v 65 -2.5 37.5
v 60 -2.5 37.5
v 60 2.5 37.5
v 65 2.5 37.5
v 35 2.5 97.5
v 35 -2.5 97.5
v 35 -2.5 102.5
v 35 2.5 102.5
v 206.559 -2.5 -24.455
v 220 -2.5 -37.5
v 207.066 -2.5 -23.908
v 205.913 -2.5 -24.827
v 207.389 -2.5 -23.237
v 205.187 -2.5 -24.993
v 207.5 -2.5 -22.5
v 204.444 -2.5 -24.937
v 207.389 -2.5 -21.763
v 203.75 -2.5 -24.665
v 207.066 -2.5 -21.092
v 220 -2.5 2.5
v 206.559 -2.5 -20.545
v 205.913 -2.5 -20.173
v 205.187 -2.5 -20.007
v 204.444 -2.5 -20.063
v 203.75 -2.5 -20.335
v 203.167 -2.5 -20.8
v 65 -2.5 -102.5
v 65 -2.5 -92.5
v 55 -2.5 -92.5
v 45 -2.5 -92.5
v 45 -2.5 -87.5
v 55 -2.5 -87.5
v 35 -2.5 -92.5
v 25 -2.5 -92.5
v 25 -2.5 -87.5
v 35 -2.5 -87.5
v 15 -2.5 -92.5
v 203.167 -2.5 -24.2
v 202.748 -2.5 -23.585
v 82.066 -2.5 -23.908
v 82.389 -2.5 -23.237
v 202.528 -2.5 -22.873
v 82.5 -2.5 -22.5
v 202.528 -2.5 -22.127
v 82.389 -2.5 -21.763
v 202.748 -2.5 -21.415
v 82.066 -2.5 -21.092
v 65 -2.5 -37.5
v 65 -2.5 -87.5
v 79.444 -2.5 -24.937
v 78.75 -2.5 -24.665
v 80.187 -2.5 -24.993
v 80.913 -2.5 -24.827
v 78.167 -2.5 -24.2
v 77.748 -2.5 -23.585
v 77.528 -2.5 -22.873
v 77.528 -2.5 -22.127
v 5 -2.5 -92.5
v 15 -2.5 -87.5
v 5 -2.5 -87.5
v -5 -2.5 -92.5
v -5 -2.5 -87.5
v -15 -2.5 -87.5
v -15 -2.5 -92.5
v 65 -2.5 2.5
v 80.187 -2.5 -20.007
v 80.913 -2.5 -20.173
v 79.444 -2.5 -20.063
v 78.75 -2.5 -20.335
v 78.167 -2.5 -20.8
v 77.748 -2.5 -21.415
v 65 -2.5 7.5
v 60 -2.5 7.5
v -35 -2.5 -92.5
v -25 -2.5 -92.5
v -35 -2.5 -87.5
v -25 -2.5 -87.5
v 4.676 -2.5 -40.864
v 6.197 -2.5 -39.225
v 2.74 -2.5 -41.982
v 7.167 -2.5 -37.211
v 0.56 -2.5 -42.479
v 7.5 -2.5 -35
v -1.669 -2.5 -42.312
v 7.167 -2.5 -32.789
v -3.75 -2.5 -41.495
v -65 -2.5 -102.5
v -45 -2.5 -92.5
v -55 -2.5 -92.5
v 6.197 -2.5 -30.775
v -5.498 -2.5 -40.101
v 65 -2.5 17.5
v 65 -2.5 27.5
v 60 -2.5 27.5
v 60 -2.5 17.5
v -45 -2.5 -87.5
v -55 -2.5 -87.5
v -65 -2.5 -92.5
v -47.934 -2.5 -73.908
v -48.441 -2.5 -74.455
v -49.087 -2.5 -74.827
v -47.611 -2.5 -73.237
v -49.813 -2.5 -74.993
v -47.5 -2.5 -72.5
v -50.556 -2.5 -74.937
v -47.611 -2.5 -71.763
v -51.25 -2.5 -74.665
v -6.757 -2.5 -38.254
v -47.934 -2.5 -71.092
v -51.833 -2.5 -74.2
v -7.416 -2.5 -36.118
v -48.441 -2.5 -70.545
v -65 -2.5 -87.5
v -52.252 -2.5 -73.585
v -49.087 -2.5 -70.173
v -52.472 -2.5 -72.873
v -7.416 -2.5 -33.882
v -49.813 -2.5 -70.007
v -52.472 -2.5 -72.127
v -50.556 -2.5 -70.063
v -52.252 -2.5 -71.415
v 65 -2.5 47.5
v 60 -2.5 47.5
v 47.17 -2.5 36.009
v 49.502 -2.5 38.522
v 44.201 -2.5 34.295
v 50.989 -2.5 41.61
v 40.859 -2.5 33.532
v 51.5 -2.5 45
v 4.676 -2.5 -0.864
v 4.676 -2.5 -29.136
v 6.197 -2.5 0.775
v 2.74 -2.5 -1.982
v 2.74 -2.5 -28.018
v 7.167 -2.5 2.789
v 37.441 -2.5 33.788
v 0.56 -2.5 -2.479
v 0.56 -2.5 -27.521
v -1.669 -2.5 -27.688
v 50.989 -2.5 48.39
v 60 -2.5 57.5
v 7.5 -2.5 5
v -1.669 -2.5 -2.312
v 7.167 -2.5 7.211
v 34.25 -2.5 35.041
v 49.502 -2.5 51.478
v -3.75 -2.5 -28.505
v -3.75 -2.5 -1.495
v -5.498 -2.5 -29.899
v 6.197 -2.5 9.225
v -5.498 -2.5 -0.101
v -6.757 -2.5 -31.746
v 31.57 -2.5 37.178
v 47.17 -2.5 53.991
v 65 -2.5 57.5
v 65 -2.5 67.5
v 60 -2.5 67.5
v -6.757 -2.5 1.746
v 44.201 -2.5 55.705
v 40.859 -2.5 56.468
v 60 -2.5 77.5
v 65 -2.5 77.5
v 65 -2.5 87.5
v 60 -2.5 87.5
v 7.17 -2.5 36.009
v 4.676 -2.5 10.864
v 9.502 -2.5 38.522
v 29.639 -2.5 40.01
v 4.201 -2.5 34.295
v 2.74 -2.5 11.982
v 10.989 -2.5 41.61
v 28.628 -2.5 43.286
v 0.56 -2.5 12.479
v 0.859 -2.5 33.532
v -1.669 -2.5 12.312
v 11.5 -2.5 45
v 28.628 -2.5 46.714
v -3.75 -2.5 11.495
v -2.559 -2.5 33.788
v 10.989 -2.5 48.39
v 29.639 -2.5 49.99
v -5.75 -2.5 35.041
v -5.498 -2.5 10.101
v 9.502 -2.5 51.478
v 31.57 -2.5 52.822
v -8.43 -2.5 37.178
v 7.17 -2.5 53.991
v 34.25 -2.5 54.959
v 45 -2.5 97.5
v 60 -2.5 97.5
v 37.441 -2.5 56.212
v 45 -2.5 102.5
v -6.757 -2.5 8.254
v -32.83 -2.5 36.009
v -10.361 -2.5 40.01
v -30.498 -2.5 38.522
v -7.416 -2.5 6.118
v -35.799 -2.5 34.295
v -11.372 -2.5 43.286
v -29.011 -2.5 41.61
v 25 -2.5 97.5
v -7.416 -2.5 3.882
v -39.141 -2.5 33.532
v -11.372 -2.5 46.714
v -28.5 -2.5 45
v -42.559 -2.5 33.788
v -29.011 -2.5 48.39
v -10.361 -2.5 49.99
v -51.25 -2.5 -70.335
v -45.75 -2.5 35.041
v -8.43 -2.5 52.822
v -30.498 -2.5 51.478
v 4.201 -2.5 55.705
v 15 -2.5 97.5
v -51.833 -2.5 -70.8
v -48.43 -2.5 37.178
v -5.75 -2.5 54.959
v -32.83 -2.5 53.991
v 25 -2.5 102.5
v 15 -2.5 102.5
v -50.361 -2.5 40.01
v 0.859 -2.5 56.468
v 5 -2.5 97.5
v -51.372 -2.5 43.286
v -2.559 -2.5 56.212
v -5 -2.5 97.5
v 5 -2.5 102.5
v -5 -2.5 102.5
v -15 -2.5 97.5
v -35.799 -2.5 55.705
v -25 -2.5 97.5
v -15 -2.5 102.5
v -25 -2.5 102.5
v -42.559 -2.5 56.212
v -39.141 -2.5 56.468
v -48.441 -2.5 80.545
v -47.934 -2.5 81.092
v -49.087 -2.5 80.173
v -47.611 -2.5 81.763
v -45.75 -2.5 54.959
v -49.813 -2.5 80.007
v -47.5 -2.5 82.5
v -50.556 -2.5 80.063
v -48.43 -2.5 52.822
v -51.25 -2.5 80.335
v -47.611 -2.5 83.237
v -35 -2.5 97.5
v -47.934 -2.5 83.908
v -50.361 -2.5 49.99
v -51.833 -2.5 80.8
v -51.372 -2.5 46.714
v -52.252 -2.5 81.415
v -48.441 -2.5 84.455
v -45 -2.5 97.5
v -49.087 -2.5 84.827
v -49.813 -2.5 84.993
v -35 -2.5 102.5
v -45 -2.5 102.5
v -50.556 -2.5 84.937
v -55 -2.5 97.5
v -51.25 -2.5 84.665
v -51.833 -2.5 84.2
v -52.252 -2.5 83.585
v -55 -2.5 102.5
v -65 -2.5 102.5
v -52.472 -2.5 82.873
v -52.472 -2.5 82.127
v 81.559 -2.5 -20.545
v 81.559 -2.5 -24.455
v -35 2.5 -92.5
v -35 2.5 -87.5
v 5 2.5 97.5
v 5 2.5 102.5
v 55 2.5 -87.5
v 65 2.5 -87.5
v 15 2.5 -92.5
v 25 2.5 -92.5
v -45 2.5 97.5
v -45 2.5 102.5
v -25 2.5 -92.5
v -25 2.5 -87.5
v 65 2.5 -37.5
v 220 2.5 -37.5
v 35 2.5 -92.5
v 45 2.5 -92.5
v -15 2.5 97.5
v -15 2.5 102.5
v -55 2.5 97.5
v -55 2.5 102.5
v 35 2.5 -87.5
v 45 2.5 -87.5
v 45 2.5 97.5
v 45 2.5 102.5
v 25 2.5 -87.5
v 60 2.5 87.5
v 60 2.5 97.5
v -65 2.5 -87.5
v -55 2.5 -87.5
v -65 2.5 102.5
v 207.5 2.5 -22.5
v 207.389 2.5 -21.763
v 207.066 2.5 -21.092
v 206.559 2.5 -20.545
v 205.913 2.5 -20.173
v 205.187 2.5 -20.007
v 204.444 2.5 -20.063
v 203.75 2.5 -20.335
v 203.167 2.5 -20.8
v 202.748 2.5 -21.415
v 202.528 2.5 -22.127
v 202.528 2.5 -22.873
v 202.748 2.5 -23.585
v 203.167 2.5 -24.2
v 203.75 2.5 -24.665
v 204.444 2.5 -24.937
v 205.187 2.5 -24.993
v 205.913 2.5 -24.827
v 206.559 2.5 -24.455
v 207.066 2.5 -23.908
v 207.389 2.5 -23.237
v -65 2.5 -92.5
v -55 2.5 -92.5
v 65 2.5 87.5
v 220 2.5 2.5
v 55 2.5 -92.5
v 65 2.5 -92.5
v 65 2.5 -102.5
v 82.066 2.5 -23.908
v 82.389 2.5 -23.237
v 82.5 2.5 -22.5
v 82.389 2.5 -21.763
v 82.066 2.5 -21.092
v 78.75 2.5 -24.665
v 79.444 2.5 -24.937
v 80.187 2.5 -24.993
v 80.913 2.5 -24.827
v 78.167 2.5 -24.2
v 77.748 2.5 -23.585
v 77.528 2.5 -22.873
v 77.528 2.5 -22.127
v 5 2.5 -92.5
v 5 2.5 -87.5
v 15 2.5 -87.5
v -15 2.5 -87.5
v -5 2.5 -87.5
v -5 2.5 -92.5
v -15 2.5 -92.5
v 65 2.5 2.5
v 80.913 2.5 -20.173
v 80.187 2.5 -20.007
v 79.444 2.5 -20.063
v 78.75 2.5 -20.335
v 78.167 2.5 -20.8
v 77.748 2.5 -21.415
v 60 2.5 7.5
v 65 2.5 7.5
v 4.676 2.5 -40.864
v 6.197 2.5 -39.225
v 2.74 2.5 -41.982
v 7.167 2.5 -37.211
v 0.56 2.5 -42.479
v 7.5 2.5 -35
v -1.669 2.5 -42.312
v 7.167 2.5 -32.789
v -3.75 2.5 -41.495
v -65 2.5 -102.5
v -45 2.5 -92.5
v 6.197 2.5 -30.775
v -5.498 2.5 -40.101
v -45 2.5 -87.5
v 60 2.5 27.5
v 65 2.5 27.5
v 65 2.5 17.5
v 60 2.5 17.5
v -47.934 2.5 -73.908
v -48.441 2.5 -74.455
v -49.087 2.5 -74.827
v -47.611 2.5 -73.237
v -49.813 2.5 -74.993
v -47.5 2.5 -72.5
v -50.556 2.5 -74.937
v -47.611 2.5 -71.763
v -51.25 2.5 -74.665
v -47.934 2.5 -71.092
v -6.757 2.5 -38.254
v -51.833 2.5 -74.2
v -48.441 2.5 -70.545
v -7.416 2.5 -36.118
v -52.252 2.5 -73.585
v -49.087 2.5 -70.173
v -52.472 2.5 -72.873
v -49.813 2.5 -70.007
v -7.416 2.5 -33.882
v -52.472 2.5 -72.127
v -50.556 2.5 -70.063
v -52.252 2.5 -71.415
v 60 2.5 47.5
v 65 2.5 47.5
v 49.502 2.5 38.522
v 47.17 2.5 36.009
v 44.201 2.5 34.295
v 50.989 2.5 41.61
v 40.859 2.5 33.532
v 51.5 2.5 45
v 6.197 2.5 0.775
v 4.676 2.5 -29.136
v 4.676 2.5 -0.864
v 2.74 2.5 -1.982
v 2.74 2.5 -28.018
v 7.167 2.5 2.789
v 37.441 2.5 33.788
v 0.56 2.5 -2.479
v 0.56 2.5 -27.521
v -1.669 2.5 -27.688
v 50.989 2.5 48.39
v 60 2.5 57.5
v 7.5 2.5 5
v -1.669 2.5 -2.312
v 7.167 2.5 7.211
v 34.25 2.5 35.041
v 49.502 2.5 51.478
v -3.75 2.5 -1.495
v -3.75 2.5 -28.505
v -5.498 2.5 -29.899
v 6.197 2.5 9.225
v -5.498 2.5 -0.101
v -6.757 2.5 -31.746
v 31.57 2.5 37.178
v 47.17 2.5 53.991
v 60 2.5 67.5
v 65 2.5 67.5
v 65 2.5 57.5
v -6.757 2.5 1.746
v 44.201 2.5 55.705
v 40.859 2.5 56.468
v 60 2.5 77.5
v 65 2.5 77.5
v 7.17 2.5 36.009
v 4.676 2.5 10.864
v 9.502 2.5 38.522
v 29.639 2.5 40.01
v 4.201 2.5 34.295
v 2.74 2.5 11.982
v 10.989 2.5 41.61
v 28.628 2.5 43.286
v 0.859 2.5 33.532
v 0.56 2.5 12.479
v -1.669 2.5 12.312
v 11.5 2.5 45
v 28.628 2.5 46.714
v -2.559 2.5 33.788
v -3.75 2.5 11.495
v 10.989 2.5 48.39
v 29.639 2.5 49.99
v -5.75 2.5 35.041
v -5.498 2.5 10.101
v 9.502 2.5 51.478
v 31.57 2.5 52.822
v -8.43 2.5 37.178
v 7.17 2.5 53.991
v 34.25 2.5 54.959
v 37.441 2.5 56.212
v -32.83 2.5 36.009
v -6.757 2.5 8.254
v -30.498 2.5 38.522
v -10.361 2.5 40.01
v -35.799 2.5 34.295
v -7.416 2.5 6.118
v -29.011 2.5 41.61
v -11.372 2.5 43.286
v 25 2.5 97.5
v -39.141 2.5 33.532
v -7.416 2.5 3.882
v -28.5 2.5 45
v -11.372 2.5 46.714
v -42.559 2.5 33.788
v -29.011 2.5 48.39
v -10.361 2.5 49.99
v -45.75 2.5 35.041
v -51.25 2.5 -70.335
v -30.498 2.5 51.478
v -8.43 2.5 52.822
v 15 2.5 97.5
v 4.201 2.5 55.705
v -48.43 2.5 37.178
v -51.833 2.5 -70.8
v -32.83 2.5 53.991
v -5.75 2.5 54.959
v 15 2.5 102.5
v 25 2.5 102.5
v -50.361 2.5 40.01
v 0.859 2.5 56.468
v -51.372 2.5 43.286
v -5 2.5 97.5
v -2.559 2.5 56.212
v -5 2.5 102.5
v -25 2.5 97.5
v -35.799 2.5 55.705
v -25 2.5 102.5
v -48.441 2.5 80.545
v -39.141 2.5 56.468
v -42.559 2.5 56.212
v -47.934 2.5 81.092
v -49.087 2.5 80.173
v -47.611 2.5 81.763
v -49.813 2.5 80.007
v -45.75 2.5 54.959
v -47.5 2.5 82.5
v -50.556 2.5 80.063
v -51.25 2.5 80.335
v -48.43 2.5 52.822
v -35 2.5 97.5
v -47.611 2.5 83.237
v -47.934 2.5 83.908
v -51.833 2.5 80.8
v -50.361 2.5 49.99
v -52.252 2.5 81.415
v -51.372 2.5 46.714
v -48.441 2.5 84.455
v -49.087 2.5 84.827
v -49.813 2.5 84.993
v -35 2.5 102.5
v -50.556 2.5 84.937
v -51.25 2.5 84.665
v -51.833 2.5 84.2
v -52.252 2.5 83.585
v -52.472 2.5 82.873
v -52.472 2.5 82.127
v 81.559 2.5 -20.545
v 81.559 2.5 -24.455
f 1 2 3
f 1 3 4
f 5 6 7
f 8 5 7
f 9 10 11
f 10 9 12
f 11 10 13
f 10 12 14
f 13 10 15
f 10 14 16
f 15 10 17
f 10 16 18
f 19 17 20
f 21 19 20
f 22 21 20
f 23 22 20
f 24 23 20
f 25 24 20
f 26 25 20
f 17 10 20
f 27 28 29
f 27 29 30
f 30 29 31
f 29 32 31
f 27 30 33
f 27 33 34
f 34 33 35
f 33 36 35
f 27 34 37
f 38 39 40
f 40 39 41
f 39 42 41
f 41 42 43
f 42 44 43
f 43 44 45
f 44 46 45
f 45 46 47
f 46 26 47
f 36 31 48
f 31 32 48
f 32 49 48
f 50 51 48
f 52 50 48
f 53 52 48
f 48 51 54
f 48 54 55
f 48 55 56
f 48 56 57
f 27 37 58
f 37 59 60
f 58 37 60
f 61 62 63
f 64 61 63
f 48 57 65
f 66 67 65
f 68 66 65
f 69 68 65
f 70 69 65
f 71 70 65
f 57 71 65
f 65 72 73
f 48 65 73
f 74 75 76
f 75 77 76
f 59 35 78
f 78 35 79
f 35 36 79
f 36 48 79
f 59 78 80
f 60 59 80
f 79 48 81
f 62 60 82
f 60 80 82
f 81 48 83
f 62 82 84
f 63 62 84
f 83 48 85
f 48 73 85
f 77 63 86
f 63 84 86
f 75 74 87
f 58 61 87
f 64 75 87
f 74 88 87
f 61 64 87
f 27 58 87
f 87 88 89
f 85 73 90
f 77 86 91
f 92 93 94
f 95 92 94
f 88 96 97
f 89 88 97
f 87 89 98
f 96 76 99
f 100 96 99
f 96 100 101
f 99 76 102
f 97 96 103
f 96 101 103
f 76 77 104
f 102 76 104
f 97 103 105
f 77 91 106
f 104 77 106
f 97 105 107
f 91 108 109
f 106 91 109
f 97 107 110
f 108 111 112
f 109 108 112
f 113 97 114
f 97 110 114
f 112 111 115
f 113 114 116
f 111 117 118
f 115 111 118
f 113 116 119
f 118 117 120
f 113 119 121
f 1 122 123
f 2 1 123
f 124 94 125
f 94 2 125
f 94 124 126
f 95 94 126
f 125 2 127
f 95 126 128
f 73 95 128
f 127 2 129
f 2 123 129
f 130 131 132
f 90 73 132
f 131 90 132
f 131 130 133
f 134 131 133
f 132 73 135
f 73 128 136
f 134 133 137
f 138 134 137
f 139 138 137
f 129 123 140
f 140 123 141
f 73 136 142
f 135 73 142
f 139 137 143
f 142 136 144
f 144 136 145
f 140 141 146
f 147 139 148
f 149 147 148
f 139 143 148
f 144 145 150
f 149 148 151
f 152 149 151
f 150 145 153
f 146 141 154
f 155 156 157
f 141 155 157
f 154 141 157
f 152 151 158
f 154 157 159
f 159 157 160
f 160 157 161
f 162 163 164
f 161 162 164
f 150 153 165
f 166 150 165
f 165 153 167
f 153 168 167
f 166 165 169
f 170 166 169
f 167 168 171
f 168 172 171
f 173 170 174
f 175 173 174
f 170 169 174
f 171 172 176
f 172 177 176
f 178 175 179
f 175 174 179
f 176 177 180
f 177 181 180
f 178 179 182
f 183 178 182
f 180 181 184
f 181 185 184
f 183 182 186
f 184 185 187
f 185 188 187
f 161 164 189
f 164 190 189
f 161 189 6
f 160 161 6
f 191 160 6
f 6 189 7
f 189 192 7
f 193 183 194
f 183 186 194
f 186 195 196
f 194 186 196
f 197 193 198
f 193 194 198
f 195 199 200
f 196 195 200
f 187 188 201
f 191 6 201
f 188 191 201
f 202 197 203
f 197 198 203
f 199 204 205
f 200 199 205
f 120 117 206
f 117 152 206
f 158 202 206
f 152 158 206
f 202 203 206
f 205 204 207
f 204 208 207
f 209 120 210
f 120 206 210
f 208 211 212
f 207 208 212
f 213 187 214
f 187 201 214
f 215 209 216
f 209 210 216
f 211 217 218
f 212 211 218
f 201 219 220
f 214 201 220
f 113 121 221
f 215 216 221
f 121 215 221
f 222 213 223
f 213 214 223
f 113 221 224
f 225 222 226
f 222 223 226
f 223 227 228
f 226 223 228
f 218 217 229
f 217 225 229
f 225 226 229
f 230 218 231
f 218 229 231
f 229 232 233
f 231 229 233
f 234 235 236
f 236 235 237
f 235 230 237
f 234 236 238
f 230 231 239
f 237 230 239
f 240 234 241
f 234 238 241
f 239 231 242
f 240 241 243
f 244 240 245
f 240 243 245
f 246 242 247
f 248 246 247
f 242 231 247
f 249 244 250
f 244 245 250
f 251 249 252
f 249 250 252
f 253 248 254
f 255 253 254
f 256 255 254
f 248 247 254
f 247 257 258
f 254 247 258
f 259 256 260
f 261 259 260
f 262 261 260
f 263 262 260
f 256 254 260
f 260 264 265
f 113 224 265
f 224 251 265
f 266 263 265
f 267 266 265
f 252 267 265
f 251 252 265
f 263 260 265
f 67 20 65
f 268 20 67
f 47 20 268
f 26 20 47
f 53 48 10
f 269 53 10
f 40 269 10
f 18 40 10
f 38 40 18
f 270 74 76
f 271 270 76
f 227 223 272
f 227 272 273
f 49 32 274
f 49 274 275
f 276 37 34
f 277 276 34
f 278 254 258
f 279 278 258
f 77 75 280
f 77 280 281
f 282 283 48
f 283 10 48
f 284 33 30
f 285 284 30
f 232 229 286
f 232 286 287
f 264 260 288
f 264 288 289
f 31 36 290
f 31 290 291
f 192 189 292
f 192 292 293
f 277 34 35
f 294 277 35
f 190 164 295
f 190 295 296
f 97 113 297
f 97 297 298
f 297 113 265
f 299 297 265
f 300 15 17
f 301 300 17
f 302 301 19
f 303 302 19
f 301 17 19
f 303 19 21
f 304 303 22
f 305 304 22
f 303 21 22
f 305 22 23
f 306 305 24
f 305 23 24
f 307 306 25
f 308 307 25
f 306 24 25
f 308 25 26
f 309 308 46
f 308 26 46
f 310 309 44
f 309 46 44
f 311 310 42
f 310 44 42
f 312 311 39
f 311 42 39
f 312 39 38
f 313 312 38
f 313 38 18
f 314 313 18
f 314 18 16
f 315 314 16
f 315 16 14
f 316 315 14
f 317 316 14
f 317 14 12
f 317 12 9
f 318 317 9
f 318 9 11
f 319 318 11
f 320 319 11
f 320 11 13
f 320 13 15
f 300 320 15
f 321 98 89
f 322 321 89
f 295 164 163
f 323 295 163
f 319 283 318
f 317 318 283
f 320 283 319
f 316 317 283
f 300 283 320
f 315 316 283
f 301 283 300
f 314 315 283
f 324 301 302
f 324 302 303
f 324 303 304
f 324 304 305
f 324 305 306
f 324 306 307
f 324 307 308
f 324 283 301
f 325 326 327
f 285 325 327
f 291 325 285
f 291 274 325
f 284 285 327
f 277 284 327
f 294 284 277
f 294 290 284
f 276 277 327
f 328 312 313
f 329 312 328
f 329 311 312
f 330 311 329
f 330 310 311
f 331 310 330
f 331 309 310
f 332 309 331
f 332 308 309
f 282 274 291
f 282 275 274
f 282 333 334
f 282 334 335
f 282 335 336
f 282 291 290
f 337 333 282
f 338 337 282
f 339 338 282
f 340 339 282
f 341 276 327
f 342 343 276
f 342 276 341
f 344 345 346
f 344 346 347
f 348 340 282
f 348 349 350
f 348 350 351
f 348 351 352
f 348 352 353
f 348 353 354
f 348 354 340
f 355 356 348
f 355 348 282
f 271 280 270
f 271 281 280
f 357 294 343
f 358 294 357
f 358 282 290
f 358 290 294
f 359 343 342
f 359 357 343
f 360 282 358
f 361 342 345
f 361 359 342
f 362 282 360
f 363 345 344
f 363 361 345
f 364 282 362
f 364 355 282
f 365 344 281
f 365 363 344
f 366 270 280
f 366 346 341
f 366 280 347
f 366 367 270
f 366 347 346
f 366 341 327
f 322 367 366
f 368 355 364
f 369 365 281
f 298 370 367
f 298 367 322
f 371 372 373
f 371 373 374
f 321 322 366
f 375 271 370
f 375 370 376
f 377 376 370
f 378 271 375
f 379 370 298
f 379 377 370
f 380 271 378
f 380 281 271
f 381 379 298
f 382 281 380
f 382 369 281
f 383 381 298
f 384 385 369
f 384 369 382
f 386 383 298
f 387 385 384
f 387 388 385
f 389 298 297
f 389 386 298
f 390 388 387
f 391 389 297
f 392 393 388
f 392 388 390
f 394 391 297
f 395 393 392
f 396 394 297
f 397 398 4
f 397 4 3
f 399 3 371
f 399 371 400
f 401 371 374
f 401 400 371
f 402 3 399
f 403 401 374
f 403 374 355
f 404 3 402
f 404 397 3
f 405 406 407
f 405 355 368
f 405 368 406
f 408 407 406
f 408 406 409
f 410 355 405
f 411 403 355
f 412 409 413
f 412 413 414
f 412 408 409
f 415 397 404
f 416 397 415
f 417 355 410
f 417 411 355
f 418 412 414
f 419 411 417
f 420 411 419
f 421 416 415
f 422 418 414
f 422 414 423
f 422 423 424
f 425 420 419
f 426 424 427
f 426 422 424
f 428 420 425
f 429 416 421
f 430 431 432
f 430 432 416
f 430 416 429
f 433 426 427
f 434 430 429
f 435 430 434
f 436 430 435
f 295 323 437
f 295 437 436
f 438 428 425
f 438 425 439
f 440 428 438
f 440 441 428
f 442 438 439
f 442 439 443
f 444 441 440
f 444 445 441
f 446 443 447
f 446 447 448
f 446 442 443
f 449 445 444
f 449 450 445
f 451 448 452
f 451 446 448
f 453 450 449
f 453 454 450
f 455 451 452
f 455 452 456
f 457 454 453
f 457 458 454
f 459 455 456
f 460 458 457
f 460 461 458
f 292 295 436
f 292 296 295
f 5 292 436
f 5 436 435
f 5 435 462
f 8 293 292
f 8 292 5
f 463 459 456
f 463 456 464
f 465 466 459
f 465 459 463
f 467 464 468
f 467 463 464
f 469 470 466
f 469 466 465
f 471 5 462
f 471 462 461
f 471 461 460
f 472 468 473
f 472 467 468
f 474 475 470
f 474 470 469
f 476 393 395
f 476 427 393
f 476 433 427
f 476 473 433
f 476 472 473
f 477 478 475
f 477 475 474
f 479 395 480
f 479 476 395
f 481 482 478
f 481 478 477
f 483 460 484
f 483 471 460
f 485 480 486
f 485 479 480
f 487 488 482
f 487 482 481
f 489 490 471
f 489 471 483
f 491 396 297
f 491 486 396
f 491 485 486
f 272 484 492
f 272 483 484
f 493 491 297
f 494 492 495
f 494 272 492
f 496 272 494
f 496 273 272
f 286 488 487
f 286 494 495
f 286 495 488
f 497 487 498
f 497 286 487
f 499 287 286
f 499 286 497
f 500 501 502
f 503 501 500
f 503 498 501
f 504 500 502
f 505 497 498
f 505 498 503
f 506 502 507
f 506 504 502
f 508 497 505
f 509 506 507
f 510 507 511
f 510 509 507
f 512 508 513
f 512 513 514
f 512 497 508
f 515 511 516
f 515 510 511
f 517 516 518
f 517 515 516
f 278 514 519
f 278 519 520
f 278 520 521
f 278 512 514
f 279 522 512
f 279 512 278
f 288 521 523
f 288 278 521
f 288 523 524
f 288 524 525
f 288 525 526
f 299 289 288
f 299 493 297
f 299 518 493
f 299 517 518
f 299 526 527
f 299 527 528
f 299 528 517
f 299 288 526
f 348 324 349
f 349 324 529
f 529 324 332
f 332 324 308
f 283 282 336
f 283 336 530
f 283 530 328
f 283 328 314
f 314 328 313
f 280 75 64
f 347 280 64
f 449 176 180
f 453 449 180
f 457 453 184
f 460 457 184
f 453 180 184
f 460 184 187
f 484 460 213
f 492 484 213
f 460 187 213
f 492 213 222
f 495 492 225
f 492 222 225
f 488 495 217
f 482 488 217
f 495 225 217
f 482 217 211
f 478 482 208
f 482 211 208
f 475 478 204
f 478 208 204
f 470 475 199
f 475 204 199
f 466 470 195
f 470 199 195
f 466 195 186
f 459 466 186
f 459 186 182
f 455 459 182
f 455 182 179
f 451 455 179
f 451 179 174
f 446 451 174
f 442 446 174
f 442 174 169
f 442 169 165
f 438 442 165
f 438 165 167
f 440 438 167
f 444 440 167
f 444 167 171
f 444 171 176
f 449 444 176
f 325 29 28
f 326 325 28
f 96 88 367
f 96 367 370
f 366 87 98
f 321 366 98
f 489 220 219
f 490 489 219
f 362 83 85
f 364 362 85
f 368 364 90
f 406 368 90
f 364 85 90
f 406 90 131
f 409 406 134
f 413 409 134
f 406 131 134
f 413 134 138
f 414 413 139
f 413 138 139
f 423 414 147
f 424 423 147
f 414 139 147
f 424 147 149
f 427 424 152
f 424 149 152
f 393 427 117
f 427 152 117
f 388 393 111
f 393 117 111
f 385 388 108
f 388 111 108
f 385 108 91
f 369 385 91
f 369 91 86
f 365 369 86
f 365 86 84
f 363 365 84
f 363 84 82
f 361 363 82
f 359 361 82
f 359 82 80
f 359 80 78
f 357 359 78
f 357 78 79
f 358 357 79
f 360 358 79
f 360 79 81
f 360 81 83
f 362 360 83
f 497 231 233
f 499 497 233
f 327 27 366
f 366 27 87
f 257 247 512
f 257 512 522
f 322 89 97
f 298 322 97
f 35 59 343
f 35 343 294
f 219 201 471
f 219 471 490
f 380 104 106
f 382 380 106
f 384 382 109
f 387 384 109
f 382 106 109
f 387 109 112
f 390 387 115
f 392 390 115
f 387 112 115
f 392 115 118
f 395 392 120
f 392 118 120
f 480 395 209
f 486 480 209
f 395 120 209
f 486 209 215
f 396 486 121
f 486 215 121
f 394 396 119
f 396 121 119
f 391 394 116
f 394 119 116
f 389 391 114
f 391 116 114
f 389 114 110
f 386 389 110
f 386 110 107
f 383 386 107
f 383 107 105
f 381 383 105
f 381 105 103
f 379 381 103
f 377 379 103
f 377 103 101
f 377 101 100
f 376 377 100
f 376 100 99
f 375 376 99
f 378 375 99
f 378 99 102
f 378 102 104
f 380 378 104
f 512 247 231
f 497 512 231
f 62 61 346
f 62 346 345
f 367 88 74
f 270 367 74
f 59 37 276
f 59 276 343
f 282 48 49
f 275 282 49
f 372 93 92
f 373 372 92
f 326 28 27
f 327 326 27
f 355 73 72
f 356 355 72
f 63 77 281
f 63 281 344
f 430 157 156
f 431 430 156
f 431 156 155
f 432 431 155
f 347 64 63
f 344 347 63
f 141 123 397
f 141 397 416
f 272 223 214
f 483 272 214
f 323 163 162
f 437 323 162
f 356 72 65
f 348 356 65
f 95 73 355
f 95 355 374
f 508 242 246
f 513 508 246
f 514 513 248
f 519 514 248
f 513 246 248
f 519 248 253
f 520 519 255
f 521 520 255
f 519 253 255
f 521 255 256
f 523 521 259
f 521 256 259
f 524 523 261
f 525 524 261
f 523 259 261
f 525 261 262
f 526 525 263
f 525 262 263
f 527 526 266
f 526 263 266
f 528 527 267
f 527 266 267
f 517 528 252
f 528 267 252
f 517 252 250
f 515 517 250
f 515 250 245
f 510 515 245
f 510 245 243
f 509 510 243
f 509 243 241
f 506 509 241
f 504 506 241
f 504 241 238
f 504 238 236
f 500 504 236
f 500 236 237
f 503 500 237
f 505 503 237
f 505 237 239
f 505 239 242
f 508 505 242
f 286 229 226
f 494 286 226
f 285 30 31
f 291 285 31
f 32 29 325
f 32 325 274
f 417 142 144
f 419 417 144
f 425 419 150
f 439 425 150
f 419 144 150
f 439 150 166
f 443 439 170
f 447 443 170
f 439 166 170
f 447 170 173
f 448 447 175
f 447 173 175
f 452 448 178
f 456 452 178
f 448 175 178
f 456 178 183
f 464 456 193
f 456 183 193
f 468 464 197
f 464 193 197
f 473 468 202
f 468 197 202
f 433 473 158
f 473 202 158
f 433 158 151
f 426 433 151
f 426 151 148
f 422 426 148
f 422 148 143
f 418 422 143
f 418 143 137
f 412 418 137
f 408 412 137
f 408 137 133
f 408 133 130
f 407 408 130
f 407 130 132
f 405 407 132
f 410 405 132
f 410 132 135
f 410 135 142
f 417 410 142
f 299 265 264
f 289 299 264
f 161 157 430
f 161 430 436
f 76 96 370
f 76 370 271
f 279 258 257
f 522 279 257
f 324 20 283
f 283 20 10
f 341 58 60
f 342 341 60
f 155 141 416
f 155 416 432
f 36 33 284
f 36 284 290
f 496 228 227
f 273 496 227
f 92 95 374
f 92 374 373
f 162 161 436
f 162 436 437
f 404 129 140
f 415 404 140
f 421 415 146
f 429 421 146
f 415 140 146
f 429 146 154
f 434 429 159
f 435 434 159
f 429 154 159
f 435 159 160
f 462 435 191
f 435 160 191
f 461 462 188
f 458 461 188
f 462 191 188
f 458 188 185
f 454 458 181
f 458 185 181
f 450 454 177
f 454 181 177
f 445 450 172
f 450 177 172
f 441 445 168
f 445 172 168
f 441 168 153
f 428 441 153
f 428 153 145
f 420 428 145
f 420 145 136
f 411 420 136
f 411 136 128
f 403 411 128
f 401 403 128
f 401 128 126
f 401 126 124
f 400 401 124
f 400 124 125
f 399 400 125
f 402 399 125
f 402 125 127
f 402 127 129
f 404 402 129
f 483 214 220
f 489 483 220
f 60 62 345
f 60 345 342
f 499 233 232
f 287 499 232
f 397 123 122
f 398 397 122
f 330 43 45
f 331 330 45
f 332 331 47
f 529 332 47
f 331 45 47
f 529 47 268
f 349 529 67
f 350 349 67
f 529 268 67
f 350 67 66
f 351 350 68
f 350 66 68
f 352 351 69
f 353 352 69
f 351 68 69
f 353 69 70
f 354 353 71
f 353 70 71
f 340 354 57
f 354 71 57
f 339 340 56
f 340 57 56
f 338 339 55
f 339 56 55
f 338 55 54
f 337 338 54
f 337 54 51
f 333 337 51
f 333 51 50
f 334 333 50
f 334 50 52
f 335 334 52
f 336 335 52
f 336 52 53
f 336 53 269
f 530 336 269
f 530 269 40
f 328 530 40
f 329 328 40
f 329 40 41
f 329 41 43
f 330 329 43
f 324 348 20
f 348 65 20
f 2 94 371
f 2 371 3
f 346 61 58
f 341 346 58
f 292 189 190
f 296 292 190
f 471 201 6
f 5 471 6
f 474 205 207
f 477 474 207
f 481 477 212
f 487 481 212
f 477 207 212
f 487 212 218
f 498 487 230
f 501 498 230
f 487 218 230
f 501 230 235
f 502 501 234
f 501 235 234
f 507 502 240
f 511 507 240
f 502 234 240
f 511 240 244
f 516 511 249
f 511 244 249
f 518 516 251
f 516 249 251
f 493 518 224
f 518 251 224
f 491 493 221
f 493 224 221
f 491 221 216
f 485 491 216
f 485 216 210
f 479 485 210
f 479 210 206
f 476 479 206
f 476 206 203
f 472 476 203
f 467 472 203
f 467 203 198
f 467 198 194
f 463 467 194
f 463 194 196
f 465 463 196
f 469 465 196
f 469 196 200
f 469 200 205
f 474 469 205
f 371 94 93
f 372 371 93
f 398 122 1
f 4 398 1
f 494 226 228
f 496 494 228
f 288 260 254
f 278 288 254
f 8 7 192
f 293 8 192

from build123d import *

# Parameters (mm, degrees)
PAD_DEPTH       = 2.5
SKETCH001_W     = 10
SKETCH001_H     = 5
POCKET_DEPTH    = 5.001
SKETCH002_R     = 2.5
POCKET001_DEPTH = 5.001
SKETCH003_W     = 10
SKETCH003_H     = 5
SKETCH003_W_2   = 20
POCKET002_DEPTH = 5.001
SKETCH004_W     = 5
SKETCH004_H     = 10
POCKET003_DEPTH = 5.001
SKETCH005_R     = 11.5
POCKET004_DEPTH = 5.001
SKETCH006_R     = 7.5
POCKET005_DEPTH = 5.001


with BuildPart() as part:
    # Sketch → Pad (new body, symmetric)
    with BuildSketch(Plane.XZ):
        Polygon((-65, 102.5), (65, 102.5), (65, 2.5), (220, 2.5), (220, -37.5), (65, -37.5), (65, -102.5), (-65, -102.5), align=None)
    extrude(amount=PAD_DEPTH, both=True)

    # Sketch001 (on Face10 of Pad) → Pocket (cut, through all)
    with BuildSketch(Plane.XZ.offset(2.5)):
        with Locations((-60, -90)):
            Rectangle(SKETCH001_W, SKETCH001_H)
        with Locations((-40, -90)):
            Rectangle(SKETCH001_W, SKETCH001_H)
        with Locations((-20, -90)):
            Rectangle(SKETCH001_W, SKETCH001_H)
        with Locations((0, -90)):
            Rectangle(SKETCH001_W, SKETCH001_H)
        with Locations((20, -90)):
            Rectangle(SKETCH001_W, SKETCH001_H)
        with Locations((40, -90)):
            Rectangle(SKETCH001_W, SKETCH001_H)
        with Locations((60, -90)):
            Rectangle(SKETCH001_W, SKETCH001_H)
    extrude(amount=-POCKET_DEPTH, mode=Mode.SUBTRACT)

    # Sketch002 (on Face5 of Pocket) → Pocket001 (cut, through all)
    with BuildSketch(Plane.XZ.offset(2.5)):
        with Locations((-50, 82.5)):
            Circle(SKETCH002_R)
        with Locations((-50, -72.5)):
            Circle(SKETCH002_R)
        with Locations((80, -22.5)):
            Circle(SKETCH002_R)
        with Locations((205, -22.5)):
            Circle(SKETCH002_R)
    extrude(amount=-POCKET001_DEPTH, mode=Mode.SUBTRACT)

    # Sketch003 (on Face5 of Pocket001) → Pocket002 (cut, through all)
    with BuildSketch(Plane.XZ.offset(2.5)):
        with Locations((-50, 100)):
            Rectangle(SKETCH003_W, SKETCH003_H)
        with Locations((-30, 100)):
            Rectangle(SKETCH003_W, SKETCH003_H)
        with Locations((-10, 100)):
            Rectangle(SKETCH003_W, SKETCH003_H)
        with Locations((10, 100)):
            Rectangle(SKETCH003_W, SKETCH003_H)
        with Locations((30, 100)):
            Rectangle(SKETCH003_W, SKETCH003_H)
        with Locations((55, 100)):
            Rectangle(SKETCH003_W_2, SKETCH003_H)
    extrude(amount=-POCKET002_DEPTH, mode=Mode.SUBTRACT)

    # Sketch004 (on Face4 of Pocket002) → Pocket003 (cut, through all)
    with BuildSketch(Plane.XZ.offset(2.5)):
        with Locations((62.5, 92.5)):
            Rectangle(SKETCH004_W, SKETCH004_H)
        with Locations((62.5, 72.5)):
            Rectangle(SKETCH004_W, SKETCH004_H)
        with Locations((62.5, 52.5)):
            Rectangle(SKETCH004_W, SKETCH004_H)
        with Locations((62.5, 32.5)):
            Rectangle(SKETCH004_W, SKETCH004_H)
        with Locations((62.5, 12.5)):
            Rectangle(SKETCH004_W, SKETCH004_H)
    extrude(amount=-POCKET003_DEPTH, mode=Mode.SUBTRACT)

    # Sketch005 (on Face4 of Pocket003) → Pocket004 (cut, through all)
    with BuildSketch(Plane.XZ.offset(2.5)):
        with Locations((-40, 45)):
            Circle(SKETCH005_R)
        with Locations((0, 45)):
            Circle(SKETCH005_R)
        with Locations((40, 45)):
            Circle(SKETCH005_R)
    extrude(amount=-POCKET004_DEPTH, mode=Mode.SUBTRACT)

    # Sketch006 (on Face4 of Pocket004) → Pocket005 (cut, through all)
    with BuildSketch(Plane.XZ.offset(2.5)):
        with Locations((0, 5)):
            Circle(SKETCH006_R)
        with Locations((0, -35)):
            Circle(SKETCH006_R)
    extrude(amount=-POCKET005_DEPTH, mode=Mode.SUBTRACT)


solid = part.part
